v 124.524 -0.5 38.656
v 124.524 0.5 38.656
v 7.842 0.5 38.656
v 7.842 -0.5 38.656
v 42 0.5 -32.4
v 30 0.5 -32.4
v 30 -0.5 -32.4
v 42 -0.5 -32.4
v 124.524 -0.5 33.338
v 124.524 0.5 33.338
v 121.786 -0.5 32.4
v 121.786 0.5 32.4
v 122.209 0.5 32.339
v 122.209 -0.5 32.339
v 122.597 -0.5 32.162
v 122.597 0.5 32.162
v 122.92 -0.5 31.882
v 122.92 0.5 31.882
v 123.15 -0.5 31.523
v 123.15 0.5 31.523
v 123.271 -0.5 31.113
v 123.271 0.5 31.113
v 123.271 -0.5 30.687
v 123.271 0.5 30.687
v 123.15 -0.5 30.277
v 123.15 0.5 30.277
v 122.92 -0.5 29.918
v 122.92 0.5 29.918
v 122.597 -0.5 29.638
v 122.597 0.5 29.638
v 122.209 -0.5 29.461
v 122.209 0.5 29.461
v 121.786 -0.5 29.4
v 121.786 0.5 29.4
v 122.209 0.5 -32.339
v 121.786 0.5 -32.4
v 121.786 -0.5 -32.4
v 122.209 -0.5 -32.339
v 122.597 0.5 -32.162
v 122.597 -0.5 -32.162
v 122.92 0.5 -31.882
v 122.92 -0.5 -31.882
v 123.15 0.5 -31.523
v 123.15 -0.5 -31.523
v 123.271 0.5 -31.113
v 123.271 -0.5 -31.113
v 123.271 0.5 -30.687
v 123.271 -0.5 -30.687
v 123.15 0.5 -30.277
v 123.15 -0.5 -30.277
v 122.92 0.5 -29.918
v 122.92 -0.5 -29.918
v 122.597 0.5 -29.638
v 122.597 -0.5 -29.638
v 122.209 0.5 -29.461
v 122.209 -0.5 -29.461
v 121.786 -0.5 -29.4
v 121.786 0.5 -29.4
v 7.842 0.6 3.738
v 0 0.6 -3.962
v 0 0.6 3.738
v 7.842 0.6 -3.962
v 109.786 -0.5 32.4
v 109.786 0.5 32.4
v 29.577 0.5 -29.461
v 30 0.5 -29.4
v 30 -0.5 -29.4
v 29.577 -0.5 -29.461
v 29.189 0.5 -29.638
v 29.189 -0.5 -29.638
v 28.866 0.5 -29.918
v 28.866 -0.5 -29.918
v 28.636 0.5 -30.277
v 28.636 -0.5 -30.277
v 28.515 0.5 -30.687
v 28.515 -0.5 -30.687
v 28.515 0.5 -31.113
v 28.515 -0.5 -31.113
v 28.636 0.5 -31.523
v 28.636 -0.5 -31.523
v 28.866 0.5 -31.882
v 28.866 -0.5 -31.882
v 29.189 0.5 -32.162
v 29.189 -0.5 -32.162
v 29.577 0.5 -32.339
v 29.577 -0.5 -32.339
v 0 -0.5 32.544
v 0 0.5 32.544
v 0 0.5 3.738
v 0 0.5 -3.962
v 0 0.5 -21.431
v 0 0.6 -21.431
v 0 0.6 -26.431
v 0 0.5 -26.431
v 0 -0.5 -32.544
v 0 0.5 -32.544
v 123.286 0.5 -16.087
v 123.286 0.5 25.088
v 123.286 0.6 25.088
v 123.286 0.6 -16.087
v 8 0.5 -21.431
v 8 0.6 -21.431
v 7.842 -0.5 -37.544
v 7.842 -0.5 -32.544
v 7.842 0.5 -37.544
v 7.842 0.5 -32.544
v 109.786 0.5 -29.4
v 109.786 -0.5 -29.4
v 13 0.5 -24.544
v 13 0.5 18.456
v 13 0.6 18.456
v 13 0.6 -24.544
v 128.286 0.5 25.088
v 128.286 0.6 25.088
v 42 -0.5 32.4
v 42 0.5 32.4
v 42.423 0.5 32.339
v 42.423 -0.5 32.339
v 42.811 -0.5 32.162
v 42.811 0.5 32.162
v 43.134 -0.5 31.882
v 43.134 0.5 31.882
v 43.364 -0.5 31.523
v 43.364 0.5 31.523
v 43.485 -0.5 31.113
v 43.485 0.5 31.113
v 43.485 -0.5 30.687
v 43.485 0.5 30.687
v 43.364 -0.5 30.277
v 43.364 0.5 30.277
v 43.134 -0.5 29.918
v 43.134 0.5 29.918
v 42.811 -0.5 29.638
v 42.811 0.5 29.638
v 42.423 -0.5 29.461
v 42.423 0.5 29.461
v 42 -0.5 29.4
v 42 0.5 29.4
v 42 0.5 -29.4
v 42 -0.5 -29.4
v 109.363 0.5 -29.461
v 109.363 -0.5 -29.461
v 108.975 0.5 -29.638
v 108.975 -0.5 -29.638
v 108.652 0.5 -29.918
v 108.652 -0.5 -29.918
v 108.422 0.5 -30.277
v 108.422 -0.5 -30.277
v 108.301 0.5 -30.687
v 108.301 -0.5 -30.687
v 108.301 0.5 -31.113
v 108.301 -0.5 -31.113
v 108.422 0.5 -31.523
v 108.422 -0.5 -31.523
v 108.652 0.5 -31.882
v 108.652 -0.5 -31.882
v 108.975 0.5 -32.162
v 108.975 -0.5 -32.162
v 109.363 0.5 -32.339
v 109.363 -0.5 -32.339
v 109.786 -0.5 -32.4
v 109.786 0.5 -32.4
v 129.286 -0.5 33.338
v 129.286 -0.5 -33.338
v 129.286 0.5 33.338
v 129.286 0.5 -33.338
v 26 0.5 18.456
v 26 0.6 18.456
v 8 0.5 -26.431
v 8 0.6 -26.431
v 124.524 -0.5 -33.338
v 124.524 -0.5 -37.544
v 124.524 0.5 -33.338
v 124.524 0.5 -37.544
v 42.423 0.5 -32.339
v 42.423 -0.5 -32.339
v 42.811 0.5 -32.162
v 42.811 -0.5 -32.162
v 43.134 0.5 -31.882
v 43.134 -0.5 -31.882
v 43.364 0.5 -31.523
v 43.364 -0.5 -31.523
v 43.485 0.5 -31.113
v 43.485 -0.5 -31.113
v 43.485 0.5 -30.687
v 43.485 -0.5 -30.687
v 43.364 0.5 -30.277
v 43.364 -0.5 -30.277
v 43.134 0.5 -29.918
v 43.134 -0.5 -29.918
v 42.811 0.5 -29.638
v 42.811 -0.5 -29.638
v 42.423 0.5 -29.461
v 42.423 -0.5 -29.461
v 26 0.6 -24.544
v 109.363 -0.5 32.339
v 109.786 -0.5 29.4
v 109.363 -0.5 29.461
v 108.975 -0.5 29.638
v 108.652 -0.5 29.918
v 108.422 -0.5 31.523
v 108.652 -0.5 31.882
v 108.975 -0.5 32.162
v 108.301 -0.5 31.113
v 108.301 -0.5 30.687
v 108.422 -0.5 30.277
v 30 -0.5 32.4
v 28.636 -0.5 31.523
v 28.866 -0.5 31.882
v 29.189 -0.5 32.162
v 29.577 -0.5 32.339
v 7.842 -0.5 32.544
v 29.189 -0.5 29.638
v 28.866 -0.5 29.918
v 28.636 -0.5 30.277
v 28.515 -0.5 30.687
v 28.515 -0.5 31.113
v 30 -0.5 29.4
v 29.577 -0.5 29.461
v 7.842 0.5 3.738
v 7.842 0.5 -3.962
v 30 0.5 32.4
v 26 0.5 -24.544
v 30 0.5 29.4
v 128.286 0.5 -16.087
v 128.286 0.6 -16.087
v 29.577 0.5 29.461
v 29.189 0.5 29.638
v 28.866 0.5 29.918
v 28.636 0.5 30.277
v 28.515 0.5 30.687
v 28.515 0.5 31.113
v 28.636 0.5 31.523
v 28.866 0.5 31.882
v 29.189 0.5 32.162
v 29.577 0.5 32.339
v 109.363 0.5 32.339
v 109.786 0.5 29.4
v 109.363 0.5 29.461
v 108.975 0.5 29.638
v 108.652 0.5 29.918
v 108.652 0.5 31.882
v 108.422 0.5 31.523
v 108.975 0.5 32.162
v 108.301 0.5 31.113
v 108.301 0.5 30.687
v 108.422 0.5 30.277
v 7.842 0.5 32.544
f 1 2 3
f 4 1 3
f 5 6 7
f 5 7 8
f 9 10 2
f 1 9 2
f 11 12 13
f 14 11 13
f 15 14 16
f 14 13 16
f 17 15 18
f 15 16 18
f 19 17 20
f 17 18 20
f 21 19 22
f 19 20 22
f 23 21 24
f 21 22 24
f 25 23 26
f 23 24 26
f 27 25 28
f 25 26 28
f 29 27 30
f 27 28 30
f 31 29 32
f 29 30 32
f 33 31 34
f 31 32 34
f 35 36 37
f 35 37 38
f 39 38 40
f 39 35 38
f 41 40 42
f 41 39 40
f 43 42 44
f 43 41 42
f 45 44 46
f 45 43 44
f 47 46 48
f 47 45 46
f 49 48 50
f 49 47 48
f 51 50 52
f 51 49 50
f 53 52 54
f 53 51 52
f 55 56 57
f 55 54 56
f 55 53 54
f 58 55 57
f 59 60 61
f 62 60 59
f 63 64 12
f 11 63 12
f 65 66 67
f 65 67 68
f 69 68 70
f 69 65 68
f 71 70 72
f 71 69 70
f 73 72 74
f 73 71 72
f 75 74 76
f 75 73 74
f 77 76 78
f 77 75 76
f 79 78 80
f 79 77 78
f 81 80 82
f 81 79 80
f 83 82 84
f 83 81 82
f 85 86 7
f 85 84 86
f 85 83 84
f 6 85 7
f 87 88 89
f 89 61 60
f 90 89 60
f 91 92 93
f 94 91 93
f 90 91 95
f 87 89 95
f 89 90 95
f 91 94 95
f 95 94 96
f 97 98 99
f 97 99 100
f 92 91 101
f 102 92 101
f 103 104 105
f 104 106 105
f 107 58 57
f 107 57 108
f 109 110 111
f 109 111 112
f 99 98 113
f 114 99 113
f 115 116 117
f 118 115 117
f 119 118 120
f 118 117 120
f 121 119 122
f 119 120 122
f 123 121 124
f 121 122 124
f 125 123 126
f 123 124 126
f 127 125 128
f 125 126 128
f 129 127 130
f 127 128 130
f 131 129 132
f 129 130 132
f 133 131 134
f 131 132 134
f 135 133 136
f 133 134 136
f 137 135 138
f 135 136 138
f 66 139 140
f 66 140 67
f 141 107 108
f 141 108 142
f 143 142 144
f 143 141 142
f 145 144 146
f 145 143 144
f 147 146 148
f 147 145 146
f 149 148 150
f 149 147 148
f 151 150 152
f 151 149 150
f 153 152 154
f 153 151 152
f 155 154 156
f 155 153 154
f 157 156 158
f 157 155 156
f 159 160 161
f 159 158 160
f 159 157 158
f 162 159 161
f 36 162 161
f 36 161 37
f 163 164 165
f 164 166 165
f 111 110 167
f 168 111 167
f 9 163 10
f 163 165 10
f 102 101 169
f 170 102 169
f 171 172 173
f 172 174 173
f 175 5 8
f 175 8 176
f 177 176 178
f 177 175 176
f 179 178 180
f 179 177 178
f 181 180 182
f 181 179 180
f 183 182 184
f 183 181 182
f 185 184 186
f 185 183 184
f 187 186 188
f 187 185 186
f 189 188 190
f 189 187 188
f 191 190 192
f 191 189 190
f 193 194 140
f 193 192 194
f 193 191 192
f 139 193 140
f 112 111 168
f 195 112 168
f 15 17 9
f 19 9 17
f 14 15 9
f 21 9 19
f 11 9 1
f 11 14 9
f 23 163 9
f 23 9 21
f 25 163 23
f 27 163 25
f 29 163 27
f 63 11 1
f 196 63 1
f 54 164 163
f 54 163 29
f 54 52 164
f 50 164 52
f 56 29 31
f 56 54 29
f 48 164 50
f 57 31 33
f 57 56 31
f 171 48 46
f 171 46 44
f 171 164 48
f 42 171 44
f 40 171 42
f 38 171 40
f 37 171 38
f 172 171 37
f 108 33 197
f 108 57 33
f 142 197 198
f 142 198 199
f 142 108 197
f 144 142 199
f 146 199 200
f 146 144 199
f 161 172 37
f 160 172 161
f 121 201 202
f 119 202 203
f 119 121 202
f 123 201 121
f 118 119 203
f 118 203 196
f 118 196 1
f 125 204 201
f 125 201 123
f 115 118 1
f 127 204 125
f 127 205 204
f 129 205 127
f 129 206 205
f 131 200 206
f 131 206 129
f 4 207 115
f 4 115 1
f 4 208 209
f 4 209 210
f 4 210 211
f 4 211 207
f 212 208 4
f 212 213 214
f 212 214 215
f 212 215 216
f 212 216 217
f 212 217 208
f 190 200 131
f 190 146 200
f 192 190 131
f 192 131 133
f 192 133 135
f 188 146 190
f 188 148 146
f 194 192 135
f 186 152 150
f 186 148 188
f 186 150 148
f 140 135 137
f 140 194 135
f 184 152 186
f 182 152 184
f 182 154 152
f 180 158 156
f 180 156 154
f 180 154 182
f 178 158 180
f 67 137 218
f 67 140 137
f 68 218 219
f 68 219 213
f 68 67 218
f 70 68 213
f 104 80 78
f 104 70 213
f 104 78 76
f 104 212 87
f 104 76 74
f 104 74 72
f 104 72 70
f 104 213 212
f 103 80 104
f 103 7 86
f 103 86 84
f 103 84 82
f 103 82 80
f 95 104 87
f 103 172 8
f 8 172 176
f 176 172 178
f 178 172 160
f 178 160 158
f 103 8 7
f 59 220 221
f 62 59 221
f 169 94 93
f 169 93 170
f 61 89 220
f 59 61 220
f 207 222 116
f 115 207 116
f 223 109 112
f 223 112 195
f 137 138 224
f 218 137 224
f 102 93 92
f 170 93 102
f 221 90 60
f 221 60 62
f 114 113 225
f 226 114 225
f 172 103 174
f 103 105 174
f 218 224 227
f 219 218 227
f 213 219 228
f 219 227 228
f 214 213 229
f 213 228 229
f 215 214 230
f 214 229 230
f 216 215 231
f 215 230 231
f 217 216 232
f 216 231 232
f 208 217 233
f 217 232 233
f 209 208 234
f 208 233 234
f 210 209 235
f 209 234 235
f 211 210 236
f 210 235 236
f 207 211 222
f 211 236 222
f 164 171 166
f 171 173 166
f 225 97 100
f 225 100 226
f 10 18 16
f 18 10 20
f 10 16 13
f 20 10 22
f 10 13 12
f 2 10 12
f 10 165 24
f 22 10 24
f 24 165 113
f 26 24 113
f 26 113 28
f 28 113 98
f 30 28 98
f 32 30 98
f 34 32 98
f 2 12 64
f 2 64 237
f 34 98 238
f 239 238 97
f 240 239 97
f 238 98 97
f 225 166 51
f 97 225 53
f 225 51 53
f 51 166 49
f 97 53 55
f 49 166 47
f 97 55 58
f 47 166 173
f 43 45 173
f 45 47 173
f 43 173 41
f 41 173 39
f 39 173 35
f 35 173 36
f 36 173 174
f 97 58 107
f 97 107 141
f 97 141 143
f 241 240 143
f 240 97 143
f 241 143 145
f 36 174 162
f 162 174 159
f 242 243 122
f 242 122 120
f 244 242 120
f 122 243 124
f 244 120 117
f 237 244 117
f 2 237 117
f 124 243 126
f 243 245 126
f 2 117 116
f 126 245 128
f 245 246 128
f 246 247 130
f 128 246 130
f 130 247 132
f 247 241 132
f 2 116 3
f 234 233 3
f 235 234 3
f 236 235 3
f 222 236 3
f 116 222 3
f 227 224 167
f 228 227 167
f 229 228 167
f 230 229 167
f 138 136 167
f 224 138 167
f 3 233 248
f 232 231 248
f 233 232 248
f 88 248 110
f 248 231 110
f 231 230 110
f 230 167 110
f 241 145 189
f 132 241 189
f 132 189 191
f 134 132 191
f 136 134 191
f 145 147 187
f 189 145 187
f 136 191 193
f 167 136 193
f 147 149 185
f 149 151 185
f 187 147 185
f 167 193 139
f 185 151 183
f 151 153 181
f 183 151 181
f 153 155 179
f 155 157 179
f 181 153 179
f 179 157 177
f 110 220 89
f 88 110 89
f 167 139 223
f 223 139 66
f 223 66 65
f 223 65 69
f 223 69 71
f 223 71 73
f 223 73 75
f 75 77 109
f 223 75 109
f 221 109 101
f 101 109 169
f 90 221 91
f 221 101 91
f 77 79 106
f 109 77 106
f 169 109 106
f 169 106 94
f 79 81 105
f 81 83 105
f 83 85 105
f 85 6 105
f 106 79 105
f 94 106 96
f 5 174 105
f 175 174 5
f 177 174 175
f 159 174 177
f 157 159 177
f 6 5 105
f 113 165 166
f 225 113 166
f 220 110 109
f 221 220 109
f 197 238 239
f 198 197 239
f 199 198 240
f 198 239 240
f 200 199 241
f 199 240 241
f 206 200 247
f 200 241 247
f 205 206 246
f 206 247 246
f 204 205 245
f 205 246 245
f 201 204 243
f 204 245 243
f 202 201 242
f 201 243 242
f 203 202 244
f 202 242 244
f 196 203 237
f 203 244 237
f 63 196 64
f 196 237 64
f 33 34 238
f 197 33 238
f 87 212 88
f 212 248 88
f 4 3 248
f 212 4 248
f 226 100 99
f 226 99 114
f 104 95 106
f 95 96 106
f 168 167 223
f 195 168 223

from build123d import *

# Parameters (mm, degrees)
EXTRUIR1_DEPTH = 0.5
EXTRUIR2_DEPTH = 135.945083127
CROQUIS3_W     = 7.84225
CROQUIS3_H     = 7.7
CROQUIS3_W_2   = 13
CROQUIS3_H_2   = 43
CROQUIS3_W_3   = 8
CROQUIS3_H_3   = 5
CROQUIS3_W_4   = 5
CROQUIS3_H_4   = 41.175
EXTRUIR3_DEPTH = 0.1


with BuildPart() as part:
    # Croquis1 → Extruir1 (new, symmetric)
    with BuildSketch(Plane(origin=(0, 0, 0), x_dir=(1, 0, 0), z_dir=(0, 1, 0))):
        Polygon((7.84225, -38.65625), (7.84225, -32.54375), (0, -32.54375), (0, 32.54375), (7.84225, 32.54375), (7.84225, 37.54375), (124.5235, 37.54375), (124.5235, 33.3375), (129.286, 33.3375), (129.286, -33.3375), (124.5235, -33.3375), (124.5235, -38.65625), align=None)
    extrude(amount=EXTRUIR1_DEPTH, both=True)

    # Croquis2 → Extruir2 (cut, through all)
    with BuildSketch(Plane(origin=(0, 0.5, 0), x_dir=(1, 0, 0), z_dir=(0, 1, 0))):
        with BuildLine():
            Line((30, 32.4), (42, 32.4))
            ThreePointArc((42, 32.4), (43.5, 30.9), (42, 29.4))
            Line((42, 29.4), (30, 29.4))
            ThreePointArc((30, 29.4), (28.5, 30.9), (30, 32.4))
        make_face()
        with BuildLine():
            Line((109.786, 32.4), (121.786, 32.4))
            ThreePointArc((121.786, 32.4), (123.286, 30.9), (121.786, 29.4))
            Line((121.786, 29.4), (109.786, 29.4))
            ThreePointArc((109.786, 29.4), (108.286, 30.9), (109.786, 32.4))
        make_face()
    extruir2 = extrude(amount=-EXTRUIR2_DEPTH, mode=Mode.SUBTRACT)

    # Simetría1: Extruir2 across plane
    add(extruir2.mirror(Plane.XY), mode=Mode.SUBTRACT)

    # Croquis3 → Extruir3 (add)
    with BuildSketch(Plane(origin=(0, 0.5, 0), x_dir=(1, 0, 0), z_dir=(0, 1, 0))):
        with Locations((3.921125, 0.1124)):
            Rectangle(CROQUIS3_W, CROQUIS3_H)
        with Locations((19.5, 3.04375)):
            Rectangle(CROQUIS3_W_2, CROQUIS3_H_2)
        with Locations((4, 23.93125)):
            Rectangle(CROQUIS3_W_3, CROQUIS3_H_3)
        with Locations((125.786, -4.5)):
            Rectangle(CROQUIS3_W_4, CROQUIS3_H_4)
    extrude(amount=EXTRUIR3_DEPTH)


solid = part.part
